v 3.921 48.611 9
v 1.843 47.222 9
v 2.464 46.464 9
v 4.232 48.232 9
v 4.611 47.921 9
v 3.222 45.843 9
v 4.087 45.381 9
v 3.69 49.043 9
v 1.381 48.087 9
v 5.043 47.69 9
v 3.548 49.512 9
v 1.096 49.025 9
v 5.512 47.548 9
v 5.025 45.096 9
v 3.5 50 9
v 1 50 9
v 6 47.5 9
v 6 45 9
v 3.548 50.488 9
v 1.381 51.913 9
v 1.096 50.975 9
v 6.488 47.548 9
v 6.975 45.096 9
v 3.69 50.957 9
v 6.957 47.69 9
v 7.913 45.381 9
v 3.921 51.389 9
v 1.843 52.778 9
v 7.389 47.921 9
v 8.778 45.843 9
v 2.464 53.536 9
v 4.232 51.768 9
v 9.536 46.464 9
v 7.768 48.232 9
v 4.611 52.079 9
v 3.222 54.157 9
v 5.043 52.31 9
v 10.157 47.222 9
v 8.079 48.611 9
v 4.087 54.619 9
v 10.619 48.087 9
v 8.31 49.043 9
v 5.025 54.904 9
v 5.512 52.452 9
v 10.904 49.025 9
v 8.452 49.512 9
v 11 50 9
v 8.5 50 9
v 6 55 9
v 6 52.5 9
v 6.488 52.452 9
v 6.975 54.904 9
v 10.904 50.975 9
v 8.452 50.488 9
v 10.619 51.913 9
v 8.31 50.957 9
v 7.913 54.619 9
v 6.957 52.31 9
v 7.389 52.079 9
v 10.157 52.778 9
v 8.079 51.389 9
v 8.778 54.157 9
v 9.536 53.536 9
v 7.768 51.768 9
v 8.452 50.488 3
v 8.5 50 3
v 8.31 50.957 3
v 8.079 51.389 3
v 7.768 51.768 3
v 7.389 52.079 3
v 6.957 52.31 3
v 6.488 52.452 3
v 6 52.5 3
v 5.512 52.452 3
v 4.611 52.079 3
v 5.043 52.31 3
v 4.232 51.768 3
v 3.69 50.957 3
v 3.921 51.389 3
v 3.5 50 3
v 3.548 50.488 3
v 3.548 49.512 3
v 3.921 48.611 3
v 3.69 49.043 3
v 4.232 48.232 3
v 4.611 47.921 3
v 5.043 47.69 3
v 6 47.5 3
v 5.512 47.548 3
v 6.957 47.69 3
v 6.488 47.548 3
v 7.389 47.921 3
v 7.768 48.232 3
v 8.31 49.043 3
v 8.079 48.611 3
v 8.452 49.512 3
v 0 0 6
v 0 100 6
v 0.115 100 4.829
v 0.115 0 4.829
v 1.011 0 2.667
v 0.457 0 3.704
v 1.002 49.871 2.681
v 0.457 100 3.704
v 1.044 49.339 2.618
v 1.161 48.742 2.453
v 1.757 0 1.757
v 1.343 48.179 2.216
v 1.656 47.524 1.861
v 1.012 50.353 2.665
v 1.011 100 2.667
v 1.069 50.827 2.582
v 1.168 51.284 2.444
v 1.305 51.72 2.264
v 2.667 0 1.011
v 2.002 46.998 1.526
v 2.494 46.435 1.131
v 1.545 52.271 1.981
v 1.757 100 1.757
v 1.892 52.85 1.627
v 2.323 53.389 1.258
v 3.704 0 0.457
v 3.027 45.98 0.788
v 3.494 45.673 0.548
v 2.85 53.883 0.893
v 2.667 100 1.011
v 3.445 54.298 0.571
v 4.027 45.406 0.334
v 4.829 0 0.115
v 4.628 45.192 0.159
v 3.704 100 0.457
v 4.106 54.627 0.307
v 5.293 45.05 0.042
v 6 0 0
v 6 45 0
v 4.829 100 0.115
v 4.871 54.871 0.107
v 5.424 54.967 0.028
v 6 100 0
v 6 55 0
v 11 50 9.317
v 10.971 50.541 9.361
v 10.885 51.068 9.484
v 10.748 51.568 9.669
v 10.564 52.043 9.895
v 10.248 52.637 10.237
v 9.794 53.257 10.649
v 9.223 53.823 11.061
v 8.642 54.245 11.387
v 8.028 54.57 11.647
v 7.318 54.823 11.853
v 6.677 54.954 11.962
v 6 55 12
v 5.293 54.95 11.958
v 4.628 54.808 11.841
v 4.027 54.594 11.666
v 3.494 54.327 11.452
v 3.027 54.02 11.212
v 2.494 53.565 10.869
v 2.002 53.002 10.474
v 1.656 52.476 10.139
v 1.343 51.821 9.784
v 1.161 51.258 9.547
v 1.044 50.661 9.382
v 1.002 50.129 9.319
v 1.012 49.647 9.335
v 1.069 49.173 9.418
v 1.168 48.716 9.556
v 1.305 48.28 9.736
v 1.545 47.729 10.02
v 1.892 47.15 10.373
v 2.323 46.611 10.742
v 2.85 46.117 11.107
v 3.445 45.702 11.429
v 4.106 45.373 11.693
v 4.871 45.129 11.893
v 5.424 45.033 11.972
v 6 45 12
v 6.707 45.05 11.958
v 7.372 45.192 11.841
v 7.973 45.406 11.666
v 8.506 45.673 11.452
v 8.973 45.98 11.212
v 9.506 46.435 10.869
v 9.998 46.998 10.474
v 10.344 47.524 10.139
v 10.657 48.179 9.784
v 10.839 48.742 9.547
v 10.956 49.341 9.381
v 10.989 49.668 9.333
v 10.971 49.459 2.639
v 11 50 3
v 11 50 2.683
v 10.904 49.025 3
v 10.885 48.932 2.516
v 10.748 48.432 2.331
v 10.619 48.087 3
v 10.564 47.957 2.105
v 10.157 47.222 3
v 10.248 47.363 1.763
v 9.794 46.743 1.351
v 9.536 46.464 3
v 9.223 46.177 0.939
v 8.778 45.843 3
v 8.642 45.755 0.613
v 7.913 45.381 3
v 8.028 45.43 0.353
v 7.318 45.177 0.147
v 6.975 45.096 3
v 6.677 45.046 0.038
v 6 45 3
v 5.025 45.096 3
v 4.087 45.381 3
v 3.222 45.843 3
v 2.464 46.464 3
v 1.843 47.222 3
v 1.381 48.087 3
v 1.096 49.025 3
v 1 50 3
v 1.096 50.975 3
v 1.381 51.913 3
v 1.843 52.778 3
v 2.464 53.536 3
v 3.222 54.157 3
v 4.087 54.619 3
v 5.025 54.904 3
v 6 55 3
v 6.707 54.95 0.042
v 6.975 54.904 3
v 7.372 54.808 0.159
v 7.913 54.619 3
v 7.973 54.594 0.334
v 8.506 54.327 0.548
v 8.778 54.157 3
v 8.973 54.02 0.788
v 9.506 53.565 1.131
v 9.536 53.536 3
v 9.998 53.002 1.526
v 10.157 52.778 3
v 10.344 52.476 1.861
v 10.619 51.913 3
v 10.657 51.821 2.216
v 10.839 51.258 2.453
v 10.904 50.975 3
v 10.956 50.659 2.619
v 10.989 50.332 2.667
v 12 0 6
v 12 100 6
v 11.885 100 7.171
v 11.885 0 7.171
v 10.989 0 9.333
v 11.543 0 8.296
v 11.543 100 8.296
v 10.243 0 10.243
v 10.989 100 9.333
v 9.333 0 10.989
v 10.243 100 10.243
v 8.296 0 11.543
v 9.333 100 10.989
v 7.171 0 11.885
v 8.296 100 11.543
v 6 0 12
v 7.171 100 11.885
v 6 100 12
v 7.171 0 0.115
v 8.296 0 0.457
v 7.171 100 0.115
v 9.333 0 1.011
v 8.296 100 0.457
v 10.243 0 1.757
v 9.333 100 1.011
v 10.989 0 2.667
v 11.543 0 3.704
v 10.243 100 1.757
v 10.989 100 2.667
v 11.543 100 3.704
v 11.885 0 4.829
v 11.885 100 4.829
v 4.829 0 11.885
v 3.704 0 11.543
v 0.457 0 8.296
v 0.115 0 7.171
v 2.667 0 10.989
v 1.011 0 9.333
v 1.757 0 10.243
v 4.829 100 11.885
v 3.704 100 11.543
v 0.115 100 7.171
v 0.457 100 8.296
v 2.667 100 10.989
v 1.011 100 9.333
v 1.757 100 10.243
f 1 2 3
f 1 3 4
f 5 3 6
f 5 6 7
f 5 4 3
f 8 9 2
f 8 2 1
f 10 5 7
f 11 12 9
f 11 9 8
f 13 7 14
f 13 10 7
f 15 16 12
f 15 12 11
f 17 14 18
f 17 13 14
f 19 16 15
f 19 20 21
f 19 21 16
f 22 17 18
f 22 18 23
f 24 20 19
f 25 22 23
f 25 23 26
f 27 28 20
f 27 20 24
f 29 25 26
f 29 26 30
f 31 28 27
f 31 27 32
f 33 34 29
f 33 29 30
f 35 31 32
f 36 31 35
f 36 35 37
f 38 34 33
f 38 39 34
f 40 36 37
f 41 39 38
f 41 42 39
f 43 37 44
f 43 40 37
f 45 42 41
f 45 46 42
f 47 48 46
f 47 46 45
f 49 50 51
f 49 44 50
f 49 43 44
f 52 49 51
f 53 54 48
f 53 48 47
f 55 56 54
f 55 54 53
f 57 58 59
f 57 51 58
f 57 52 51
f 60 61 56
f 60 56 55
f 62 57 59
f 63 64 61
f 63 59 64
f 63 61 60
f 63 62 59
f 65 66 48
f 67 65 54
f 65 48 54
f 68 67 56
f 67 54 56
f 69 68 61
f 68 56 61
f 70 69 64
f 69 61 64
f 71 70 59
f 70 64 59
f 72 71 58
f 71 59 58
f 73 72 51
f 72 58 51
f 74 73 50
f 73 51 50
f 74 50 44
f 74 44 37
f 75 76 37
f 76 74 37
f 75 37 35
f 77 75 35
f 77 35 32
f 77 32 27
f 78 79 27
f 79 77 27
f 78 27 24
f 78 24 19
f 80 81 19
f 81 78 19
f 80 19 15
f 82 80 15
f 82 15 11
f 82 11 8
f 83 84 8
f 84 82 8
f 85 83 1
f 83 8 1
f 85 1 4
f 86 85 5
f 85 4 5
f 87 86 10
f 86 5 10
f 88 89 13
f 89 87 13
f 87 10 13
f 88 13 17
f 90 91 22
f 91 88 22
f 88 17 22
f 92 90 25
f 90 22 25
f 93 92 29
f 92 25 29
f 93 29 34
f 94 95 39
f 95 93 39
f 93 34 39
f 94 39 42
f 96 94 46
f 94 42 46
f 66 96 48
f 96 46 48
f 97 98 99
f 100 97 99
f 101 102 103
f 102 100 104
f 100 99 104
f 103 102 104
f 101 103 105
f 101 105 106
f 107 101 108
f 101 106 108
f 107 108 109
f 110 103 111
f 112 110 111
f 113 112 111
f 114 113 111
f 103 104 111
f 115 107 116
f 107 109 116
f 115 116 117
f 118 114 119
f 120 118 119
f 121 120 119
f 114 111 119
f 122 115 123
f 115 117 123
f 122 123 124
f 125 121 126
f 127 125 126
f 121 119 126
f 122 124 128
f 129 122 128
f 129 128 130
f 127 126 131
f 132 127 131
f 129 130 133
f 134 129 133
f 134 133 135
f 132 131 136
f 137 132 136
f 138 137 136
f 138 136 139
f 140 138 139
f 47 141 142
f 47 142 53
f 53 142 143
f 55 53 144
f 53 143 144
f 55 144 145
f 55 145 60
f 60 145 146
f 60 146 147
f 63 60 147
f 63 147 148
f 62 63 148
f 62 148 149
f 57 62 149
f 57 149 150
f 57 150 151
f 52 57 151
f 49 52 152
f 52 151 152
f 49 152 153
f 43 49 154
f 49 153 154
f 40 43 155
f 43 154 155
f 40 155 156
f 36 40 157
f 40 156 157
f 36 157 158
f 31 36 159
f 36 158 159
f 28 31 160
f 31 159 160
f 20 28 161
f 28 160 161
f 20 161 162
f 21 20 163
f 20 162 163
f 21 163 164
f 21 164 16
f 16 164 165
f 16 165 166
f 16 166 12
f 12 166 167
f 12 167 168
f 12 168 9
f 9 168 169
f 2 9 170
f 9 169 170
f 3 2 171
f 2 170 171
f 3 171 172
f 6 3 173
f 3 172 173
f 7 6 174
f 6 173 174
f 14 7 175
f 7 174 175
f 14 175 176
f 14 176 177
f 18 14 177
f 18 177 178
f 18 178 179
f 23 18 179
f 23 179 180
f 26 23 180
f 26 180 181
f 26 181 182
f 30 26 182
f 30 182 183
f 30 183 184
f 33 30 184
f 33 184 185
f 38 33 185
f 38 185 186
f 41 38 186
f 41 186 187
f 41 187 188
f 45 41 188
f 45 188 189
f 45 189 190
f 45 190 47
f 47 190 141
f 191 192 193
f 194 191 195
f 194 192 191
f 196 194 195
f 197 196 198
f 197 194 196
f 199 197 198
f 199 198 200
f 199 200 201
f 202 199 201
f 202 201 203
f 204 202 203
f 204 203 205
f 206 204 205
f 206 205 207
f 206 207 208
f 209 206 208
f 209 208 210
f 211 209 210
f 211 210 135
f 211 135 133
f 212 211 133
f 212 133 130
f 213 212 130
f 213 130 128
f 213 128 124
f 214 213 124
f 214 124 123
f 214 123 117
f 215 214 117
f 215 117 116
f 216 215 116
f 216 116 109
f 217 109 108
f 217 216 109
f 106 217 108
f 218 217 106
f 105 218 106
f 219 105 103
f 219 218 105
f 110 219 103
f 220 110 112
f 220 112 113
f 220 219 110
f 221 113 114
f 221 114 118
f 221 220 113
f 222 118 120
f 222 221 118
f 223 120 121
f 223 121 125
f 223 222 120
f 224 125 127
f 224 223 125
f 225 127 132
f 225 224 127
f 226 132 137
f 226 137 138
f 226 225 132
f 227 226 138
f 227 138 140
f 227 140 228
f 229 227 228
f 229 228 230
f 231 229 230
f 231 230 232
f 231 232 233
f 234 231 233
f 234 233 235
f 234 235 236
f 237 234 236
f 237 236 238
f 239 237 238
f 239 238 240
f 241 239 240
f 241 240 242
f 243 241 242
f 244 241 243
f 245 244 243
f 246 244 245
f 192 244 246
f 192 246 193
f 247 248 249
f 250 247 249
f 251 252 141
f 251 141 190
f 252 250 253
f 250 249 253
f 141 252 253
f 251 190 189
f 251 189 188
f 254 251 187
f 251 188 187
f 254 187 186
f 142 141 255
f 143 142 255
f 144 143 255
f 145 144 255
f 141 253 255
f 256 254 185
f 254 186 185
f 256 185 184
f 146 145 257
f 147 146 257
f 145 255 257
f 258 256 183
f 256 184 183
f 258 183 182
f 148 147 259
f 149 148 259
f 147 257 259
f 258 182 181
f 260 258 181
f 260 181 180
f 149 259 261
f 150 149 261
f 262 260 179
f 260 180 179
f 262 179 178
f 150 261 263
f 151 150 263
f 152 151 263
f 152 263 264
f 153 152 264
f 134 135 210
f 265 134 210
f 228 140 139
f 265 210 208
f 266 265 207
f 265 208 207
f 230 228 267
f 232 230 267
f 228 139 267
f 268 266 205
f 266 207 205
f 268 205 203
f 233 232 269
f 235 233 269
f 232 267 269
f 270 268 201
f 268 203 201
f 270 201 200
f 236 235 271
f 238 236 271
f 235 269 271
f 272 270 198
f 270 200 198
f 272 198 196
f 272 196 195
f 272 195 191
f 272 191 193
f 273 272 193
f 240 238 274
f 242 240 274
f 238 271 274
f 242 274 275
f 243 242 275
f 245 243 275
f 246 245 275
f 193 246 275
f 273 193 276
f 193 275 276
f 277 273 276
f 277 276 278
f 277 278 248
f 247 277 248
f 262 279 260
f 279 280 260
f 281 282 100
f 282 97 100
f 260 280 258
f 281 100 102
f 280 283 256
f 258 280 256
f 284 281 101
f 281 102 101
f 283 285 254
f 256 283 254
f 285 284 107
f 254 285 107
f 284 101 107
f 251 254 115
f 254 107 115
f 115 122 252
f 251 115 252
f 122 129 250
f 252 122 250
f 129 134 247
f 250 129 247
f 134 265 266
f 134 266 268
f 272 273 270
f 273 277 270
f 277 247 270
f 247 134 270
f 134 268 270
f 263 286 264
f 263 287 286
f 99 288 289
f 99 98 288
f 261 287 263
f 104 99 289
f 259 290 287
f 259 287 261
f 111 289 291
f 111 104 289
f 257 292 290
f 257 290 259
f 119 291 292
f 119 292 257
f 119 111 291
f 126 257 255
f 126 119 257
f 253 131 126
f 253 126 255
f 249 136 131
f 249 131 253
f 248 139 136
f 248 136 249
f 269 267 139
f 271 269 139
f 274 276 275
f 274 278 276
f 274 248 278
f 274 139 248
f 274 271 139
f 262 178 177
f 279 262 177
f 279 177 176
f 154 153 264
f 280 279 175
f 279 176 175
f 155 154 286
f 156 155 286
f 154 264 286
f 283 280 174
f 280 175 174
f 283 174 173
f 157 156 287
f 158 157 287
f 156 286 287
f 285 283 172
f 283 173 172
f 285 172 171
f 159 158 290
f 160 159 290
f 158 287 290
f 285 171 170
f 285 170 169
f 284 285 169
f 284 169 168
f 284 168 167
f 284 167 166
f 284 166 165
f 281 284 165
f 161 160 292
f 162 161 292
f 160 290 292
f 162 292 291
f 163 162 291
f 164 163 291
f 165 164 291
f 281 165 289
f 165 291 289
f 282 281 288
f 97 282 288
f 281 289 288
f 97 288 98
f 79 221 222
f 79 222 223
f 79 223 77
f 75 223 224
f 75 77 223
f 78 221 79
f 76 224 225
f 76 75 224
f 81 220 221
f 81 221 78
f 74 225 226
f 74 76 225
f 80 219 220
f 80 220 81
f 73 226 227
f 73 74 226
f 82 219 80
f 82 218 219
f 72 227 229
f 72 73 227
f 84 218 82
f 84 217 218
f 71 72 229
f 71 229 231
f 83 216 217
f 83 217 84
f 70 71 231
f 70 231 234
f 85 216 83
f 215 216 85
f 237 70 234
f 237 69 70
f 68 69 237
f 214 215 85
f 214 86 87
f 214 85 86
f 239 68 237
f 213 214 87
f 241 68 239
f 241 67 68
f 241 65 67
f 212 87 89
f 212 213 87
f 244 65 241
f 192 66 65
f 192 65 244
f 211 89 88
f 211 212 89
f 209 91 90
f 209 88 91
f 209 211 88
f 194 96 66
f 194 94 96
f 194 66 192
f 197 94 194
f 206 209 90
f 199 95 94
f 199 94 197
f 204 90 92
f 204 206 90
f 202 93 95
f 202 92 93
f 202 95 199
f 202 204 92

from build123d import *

# Parameters (mm, degrees)
SKETCH1_W           = 12
SKETCH1_H           = 12
BOSS_EXTRUDE1_DEPTH = 100
CUT_EXTRUDE1_REACH  = 103.43
SKETCH5_R           = 2.5
SKETCH6_R           = 5
CUT_EXTRUDE3_DEPTH  = 3
CUT_EXTRUDE4_START  = -3
SKETCH7_R           = 5
SKETCH7_R_2         = 2.5
CUT_EXTRUDE4_DEPTH  = 3
CUT_EXTRUDE5_DEPTH  = 100


with BuildPart() as part:
    # Sketch1 → Boss-Extrude1 (new body)
    with BuildSketch(Plane(origin=(0, 0, 0), x_dir=(1, 0, 0), z_dir=(0, 1, 0))):
        with Locations((6, -6)):
            Rectangle(SKETCH1_W, SKETCH1_H)
    extrude(amount=BOSS_EXTRUDE1_DEPTH)

    # Sketch5 → Cut-Extrude1 (cut, up to next)
    with BuildSketch(Plane.XY.offset(12), mode=Mode.PRIVATE) as cut_extrude1_sk1:
        with Locations((6, 50)):
            Circle(SKETCH5_R)
    cut_extrude1_tool1 = extrude(cut_extrude1_sk1.sketch, amount=-CUT_EXTRUDE1_REACH, mode=Mode.PRIVATE) & part.part
    add(cut_extrude1_tool1.solids().sort_by_distance((6, 50, 12))[0], mode=Mode.SUBTRACT)

    # Sketch6 → Cut-Extrude3 (cut)
    with BuildSketch(Plane.XY.offset(12)):
        with Locations((6, 50)):
            Circle(SKETCH6_R)
    extrude(amount=-CUT_EXTRUDE3_DEPTH, mode=Mode.SUBTRACT)

    # Sketch7 → Cut-Extrude4 (cut)
    with BuildSketch(Plane(origin=(0, 0, 0), x_dir=(-1, 0, 0), z_dir=(0, 0, -1)).offset(CUT_EXTRUDE4_START)):
        with Locations(Location((-6, 50, 0), (0, 0, 180))):
            Circle(SKETCH7_R)
        with Locations(Location((-6, 50, 0), (0, 0, 180))):
            Circle(SKETCH7_R_2, mode=Mode.SUBTRACT)
    extrude(amount=CUT_EXTRUDE4_DEPTH, mode=Mode.SUBTRACT)

    # Sketch8 → Cut-Extrude5 (cut)
    with BuildSketch(Plane(origin=(0, 100, 0), x_dir=(1, 0, 0), z_dir=(0, 1, 0))):
        with BuildLine():
            Line((0, -12), (6, -12))
            ThreePointArc((6, -12), (1.757359303, -10.242640677), (0, -5.999999971))
            Line((0, -5.999999971), (0, -12))
        make_face()
        with BuildLine():
            Line((12, -12), (12, -6))
            ThreePointArc((12, -6), (10.242640687, -10.242640687), (6, -12))
            Line((6, -12), (12, -12))
        make_face()
        with BuildLine():
            ThreePointArc((5.999999987, 0), (10.242640683, -1.757359308), (12, -6))
            Line((12, -6), (12, 0))
            Line((12, 0), (5.999999987, 0))
        make_face()
        with BuildLine():
            ThreePointArc((0, -5.999999971), (1.757359319, -1.757359307), (5.999999987, 0))
            Line((5.999999987, 0), (0, 0))
            Line((0, 0), (0, -5.999999971))
        make_face()
    extrude(amount=-CUT_EXTRUDE5_DEPTH, mode=Mode.SUBTRACT)


solid = part.part
